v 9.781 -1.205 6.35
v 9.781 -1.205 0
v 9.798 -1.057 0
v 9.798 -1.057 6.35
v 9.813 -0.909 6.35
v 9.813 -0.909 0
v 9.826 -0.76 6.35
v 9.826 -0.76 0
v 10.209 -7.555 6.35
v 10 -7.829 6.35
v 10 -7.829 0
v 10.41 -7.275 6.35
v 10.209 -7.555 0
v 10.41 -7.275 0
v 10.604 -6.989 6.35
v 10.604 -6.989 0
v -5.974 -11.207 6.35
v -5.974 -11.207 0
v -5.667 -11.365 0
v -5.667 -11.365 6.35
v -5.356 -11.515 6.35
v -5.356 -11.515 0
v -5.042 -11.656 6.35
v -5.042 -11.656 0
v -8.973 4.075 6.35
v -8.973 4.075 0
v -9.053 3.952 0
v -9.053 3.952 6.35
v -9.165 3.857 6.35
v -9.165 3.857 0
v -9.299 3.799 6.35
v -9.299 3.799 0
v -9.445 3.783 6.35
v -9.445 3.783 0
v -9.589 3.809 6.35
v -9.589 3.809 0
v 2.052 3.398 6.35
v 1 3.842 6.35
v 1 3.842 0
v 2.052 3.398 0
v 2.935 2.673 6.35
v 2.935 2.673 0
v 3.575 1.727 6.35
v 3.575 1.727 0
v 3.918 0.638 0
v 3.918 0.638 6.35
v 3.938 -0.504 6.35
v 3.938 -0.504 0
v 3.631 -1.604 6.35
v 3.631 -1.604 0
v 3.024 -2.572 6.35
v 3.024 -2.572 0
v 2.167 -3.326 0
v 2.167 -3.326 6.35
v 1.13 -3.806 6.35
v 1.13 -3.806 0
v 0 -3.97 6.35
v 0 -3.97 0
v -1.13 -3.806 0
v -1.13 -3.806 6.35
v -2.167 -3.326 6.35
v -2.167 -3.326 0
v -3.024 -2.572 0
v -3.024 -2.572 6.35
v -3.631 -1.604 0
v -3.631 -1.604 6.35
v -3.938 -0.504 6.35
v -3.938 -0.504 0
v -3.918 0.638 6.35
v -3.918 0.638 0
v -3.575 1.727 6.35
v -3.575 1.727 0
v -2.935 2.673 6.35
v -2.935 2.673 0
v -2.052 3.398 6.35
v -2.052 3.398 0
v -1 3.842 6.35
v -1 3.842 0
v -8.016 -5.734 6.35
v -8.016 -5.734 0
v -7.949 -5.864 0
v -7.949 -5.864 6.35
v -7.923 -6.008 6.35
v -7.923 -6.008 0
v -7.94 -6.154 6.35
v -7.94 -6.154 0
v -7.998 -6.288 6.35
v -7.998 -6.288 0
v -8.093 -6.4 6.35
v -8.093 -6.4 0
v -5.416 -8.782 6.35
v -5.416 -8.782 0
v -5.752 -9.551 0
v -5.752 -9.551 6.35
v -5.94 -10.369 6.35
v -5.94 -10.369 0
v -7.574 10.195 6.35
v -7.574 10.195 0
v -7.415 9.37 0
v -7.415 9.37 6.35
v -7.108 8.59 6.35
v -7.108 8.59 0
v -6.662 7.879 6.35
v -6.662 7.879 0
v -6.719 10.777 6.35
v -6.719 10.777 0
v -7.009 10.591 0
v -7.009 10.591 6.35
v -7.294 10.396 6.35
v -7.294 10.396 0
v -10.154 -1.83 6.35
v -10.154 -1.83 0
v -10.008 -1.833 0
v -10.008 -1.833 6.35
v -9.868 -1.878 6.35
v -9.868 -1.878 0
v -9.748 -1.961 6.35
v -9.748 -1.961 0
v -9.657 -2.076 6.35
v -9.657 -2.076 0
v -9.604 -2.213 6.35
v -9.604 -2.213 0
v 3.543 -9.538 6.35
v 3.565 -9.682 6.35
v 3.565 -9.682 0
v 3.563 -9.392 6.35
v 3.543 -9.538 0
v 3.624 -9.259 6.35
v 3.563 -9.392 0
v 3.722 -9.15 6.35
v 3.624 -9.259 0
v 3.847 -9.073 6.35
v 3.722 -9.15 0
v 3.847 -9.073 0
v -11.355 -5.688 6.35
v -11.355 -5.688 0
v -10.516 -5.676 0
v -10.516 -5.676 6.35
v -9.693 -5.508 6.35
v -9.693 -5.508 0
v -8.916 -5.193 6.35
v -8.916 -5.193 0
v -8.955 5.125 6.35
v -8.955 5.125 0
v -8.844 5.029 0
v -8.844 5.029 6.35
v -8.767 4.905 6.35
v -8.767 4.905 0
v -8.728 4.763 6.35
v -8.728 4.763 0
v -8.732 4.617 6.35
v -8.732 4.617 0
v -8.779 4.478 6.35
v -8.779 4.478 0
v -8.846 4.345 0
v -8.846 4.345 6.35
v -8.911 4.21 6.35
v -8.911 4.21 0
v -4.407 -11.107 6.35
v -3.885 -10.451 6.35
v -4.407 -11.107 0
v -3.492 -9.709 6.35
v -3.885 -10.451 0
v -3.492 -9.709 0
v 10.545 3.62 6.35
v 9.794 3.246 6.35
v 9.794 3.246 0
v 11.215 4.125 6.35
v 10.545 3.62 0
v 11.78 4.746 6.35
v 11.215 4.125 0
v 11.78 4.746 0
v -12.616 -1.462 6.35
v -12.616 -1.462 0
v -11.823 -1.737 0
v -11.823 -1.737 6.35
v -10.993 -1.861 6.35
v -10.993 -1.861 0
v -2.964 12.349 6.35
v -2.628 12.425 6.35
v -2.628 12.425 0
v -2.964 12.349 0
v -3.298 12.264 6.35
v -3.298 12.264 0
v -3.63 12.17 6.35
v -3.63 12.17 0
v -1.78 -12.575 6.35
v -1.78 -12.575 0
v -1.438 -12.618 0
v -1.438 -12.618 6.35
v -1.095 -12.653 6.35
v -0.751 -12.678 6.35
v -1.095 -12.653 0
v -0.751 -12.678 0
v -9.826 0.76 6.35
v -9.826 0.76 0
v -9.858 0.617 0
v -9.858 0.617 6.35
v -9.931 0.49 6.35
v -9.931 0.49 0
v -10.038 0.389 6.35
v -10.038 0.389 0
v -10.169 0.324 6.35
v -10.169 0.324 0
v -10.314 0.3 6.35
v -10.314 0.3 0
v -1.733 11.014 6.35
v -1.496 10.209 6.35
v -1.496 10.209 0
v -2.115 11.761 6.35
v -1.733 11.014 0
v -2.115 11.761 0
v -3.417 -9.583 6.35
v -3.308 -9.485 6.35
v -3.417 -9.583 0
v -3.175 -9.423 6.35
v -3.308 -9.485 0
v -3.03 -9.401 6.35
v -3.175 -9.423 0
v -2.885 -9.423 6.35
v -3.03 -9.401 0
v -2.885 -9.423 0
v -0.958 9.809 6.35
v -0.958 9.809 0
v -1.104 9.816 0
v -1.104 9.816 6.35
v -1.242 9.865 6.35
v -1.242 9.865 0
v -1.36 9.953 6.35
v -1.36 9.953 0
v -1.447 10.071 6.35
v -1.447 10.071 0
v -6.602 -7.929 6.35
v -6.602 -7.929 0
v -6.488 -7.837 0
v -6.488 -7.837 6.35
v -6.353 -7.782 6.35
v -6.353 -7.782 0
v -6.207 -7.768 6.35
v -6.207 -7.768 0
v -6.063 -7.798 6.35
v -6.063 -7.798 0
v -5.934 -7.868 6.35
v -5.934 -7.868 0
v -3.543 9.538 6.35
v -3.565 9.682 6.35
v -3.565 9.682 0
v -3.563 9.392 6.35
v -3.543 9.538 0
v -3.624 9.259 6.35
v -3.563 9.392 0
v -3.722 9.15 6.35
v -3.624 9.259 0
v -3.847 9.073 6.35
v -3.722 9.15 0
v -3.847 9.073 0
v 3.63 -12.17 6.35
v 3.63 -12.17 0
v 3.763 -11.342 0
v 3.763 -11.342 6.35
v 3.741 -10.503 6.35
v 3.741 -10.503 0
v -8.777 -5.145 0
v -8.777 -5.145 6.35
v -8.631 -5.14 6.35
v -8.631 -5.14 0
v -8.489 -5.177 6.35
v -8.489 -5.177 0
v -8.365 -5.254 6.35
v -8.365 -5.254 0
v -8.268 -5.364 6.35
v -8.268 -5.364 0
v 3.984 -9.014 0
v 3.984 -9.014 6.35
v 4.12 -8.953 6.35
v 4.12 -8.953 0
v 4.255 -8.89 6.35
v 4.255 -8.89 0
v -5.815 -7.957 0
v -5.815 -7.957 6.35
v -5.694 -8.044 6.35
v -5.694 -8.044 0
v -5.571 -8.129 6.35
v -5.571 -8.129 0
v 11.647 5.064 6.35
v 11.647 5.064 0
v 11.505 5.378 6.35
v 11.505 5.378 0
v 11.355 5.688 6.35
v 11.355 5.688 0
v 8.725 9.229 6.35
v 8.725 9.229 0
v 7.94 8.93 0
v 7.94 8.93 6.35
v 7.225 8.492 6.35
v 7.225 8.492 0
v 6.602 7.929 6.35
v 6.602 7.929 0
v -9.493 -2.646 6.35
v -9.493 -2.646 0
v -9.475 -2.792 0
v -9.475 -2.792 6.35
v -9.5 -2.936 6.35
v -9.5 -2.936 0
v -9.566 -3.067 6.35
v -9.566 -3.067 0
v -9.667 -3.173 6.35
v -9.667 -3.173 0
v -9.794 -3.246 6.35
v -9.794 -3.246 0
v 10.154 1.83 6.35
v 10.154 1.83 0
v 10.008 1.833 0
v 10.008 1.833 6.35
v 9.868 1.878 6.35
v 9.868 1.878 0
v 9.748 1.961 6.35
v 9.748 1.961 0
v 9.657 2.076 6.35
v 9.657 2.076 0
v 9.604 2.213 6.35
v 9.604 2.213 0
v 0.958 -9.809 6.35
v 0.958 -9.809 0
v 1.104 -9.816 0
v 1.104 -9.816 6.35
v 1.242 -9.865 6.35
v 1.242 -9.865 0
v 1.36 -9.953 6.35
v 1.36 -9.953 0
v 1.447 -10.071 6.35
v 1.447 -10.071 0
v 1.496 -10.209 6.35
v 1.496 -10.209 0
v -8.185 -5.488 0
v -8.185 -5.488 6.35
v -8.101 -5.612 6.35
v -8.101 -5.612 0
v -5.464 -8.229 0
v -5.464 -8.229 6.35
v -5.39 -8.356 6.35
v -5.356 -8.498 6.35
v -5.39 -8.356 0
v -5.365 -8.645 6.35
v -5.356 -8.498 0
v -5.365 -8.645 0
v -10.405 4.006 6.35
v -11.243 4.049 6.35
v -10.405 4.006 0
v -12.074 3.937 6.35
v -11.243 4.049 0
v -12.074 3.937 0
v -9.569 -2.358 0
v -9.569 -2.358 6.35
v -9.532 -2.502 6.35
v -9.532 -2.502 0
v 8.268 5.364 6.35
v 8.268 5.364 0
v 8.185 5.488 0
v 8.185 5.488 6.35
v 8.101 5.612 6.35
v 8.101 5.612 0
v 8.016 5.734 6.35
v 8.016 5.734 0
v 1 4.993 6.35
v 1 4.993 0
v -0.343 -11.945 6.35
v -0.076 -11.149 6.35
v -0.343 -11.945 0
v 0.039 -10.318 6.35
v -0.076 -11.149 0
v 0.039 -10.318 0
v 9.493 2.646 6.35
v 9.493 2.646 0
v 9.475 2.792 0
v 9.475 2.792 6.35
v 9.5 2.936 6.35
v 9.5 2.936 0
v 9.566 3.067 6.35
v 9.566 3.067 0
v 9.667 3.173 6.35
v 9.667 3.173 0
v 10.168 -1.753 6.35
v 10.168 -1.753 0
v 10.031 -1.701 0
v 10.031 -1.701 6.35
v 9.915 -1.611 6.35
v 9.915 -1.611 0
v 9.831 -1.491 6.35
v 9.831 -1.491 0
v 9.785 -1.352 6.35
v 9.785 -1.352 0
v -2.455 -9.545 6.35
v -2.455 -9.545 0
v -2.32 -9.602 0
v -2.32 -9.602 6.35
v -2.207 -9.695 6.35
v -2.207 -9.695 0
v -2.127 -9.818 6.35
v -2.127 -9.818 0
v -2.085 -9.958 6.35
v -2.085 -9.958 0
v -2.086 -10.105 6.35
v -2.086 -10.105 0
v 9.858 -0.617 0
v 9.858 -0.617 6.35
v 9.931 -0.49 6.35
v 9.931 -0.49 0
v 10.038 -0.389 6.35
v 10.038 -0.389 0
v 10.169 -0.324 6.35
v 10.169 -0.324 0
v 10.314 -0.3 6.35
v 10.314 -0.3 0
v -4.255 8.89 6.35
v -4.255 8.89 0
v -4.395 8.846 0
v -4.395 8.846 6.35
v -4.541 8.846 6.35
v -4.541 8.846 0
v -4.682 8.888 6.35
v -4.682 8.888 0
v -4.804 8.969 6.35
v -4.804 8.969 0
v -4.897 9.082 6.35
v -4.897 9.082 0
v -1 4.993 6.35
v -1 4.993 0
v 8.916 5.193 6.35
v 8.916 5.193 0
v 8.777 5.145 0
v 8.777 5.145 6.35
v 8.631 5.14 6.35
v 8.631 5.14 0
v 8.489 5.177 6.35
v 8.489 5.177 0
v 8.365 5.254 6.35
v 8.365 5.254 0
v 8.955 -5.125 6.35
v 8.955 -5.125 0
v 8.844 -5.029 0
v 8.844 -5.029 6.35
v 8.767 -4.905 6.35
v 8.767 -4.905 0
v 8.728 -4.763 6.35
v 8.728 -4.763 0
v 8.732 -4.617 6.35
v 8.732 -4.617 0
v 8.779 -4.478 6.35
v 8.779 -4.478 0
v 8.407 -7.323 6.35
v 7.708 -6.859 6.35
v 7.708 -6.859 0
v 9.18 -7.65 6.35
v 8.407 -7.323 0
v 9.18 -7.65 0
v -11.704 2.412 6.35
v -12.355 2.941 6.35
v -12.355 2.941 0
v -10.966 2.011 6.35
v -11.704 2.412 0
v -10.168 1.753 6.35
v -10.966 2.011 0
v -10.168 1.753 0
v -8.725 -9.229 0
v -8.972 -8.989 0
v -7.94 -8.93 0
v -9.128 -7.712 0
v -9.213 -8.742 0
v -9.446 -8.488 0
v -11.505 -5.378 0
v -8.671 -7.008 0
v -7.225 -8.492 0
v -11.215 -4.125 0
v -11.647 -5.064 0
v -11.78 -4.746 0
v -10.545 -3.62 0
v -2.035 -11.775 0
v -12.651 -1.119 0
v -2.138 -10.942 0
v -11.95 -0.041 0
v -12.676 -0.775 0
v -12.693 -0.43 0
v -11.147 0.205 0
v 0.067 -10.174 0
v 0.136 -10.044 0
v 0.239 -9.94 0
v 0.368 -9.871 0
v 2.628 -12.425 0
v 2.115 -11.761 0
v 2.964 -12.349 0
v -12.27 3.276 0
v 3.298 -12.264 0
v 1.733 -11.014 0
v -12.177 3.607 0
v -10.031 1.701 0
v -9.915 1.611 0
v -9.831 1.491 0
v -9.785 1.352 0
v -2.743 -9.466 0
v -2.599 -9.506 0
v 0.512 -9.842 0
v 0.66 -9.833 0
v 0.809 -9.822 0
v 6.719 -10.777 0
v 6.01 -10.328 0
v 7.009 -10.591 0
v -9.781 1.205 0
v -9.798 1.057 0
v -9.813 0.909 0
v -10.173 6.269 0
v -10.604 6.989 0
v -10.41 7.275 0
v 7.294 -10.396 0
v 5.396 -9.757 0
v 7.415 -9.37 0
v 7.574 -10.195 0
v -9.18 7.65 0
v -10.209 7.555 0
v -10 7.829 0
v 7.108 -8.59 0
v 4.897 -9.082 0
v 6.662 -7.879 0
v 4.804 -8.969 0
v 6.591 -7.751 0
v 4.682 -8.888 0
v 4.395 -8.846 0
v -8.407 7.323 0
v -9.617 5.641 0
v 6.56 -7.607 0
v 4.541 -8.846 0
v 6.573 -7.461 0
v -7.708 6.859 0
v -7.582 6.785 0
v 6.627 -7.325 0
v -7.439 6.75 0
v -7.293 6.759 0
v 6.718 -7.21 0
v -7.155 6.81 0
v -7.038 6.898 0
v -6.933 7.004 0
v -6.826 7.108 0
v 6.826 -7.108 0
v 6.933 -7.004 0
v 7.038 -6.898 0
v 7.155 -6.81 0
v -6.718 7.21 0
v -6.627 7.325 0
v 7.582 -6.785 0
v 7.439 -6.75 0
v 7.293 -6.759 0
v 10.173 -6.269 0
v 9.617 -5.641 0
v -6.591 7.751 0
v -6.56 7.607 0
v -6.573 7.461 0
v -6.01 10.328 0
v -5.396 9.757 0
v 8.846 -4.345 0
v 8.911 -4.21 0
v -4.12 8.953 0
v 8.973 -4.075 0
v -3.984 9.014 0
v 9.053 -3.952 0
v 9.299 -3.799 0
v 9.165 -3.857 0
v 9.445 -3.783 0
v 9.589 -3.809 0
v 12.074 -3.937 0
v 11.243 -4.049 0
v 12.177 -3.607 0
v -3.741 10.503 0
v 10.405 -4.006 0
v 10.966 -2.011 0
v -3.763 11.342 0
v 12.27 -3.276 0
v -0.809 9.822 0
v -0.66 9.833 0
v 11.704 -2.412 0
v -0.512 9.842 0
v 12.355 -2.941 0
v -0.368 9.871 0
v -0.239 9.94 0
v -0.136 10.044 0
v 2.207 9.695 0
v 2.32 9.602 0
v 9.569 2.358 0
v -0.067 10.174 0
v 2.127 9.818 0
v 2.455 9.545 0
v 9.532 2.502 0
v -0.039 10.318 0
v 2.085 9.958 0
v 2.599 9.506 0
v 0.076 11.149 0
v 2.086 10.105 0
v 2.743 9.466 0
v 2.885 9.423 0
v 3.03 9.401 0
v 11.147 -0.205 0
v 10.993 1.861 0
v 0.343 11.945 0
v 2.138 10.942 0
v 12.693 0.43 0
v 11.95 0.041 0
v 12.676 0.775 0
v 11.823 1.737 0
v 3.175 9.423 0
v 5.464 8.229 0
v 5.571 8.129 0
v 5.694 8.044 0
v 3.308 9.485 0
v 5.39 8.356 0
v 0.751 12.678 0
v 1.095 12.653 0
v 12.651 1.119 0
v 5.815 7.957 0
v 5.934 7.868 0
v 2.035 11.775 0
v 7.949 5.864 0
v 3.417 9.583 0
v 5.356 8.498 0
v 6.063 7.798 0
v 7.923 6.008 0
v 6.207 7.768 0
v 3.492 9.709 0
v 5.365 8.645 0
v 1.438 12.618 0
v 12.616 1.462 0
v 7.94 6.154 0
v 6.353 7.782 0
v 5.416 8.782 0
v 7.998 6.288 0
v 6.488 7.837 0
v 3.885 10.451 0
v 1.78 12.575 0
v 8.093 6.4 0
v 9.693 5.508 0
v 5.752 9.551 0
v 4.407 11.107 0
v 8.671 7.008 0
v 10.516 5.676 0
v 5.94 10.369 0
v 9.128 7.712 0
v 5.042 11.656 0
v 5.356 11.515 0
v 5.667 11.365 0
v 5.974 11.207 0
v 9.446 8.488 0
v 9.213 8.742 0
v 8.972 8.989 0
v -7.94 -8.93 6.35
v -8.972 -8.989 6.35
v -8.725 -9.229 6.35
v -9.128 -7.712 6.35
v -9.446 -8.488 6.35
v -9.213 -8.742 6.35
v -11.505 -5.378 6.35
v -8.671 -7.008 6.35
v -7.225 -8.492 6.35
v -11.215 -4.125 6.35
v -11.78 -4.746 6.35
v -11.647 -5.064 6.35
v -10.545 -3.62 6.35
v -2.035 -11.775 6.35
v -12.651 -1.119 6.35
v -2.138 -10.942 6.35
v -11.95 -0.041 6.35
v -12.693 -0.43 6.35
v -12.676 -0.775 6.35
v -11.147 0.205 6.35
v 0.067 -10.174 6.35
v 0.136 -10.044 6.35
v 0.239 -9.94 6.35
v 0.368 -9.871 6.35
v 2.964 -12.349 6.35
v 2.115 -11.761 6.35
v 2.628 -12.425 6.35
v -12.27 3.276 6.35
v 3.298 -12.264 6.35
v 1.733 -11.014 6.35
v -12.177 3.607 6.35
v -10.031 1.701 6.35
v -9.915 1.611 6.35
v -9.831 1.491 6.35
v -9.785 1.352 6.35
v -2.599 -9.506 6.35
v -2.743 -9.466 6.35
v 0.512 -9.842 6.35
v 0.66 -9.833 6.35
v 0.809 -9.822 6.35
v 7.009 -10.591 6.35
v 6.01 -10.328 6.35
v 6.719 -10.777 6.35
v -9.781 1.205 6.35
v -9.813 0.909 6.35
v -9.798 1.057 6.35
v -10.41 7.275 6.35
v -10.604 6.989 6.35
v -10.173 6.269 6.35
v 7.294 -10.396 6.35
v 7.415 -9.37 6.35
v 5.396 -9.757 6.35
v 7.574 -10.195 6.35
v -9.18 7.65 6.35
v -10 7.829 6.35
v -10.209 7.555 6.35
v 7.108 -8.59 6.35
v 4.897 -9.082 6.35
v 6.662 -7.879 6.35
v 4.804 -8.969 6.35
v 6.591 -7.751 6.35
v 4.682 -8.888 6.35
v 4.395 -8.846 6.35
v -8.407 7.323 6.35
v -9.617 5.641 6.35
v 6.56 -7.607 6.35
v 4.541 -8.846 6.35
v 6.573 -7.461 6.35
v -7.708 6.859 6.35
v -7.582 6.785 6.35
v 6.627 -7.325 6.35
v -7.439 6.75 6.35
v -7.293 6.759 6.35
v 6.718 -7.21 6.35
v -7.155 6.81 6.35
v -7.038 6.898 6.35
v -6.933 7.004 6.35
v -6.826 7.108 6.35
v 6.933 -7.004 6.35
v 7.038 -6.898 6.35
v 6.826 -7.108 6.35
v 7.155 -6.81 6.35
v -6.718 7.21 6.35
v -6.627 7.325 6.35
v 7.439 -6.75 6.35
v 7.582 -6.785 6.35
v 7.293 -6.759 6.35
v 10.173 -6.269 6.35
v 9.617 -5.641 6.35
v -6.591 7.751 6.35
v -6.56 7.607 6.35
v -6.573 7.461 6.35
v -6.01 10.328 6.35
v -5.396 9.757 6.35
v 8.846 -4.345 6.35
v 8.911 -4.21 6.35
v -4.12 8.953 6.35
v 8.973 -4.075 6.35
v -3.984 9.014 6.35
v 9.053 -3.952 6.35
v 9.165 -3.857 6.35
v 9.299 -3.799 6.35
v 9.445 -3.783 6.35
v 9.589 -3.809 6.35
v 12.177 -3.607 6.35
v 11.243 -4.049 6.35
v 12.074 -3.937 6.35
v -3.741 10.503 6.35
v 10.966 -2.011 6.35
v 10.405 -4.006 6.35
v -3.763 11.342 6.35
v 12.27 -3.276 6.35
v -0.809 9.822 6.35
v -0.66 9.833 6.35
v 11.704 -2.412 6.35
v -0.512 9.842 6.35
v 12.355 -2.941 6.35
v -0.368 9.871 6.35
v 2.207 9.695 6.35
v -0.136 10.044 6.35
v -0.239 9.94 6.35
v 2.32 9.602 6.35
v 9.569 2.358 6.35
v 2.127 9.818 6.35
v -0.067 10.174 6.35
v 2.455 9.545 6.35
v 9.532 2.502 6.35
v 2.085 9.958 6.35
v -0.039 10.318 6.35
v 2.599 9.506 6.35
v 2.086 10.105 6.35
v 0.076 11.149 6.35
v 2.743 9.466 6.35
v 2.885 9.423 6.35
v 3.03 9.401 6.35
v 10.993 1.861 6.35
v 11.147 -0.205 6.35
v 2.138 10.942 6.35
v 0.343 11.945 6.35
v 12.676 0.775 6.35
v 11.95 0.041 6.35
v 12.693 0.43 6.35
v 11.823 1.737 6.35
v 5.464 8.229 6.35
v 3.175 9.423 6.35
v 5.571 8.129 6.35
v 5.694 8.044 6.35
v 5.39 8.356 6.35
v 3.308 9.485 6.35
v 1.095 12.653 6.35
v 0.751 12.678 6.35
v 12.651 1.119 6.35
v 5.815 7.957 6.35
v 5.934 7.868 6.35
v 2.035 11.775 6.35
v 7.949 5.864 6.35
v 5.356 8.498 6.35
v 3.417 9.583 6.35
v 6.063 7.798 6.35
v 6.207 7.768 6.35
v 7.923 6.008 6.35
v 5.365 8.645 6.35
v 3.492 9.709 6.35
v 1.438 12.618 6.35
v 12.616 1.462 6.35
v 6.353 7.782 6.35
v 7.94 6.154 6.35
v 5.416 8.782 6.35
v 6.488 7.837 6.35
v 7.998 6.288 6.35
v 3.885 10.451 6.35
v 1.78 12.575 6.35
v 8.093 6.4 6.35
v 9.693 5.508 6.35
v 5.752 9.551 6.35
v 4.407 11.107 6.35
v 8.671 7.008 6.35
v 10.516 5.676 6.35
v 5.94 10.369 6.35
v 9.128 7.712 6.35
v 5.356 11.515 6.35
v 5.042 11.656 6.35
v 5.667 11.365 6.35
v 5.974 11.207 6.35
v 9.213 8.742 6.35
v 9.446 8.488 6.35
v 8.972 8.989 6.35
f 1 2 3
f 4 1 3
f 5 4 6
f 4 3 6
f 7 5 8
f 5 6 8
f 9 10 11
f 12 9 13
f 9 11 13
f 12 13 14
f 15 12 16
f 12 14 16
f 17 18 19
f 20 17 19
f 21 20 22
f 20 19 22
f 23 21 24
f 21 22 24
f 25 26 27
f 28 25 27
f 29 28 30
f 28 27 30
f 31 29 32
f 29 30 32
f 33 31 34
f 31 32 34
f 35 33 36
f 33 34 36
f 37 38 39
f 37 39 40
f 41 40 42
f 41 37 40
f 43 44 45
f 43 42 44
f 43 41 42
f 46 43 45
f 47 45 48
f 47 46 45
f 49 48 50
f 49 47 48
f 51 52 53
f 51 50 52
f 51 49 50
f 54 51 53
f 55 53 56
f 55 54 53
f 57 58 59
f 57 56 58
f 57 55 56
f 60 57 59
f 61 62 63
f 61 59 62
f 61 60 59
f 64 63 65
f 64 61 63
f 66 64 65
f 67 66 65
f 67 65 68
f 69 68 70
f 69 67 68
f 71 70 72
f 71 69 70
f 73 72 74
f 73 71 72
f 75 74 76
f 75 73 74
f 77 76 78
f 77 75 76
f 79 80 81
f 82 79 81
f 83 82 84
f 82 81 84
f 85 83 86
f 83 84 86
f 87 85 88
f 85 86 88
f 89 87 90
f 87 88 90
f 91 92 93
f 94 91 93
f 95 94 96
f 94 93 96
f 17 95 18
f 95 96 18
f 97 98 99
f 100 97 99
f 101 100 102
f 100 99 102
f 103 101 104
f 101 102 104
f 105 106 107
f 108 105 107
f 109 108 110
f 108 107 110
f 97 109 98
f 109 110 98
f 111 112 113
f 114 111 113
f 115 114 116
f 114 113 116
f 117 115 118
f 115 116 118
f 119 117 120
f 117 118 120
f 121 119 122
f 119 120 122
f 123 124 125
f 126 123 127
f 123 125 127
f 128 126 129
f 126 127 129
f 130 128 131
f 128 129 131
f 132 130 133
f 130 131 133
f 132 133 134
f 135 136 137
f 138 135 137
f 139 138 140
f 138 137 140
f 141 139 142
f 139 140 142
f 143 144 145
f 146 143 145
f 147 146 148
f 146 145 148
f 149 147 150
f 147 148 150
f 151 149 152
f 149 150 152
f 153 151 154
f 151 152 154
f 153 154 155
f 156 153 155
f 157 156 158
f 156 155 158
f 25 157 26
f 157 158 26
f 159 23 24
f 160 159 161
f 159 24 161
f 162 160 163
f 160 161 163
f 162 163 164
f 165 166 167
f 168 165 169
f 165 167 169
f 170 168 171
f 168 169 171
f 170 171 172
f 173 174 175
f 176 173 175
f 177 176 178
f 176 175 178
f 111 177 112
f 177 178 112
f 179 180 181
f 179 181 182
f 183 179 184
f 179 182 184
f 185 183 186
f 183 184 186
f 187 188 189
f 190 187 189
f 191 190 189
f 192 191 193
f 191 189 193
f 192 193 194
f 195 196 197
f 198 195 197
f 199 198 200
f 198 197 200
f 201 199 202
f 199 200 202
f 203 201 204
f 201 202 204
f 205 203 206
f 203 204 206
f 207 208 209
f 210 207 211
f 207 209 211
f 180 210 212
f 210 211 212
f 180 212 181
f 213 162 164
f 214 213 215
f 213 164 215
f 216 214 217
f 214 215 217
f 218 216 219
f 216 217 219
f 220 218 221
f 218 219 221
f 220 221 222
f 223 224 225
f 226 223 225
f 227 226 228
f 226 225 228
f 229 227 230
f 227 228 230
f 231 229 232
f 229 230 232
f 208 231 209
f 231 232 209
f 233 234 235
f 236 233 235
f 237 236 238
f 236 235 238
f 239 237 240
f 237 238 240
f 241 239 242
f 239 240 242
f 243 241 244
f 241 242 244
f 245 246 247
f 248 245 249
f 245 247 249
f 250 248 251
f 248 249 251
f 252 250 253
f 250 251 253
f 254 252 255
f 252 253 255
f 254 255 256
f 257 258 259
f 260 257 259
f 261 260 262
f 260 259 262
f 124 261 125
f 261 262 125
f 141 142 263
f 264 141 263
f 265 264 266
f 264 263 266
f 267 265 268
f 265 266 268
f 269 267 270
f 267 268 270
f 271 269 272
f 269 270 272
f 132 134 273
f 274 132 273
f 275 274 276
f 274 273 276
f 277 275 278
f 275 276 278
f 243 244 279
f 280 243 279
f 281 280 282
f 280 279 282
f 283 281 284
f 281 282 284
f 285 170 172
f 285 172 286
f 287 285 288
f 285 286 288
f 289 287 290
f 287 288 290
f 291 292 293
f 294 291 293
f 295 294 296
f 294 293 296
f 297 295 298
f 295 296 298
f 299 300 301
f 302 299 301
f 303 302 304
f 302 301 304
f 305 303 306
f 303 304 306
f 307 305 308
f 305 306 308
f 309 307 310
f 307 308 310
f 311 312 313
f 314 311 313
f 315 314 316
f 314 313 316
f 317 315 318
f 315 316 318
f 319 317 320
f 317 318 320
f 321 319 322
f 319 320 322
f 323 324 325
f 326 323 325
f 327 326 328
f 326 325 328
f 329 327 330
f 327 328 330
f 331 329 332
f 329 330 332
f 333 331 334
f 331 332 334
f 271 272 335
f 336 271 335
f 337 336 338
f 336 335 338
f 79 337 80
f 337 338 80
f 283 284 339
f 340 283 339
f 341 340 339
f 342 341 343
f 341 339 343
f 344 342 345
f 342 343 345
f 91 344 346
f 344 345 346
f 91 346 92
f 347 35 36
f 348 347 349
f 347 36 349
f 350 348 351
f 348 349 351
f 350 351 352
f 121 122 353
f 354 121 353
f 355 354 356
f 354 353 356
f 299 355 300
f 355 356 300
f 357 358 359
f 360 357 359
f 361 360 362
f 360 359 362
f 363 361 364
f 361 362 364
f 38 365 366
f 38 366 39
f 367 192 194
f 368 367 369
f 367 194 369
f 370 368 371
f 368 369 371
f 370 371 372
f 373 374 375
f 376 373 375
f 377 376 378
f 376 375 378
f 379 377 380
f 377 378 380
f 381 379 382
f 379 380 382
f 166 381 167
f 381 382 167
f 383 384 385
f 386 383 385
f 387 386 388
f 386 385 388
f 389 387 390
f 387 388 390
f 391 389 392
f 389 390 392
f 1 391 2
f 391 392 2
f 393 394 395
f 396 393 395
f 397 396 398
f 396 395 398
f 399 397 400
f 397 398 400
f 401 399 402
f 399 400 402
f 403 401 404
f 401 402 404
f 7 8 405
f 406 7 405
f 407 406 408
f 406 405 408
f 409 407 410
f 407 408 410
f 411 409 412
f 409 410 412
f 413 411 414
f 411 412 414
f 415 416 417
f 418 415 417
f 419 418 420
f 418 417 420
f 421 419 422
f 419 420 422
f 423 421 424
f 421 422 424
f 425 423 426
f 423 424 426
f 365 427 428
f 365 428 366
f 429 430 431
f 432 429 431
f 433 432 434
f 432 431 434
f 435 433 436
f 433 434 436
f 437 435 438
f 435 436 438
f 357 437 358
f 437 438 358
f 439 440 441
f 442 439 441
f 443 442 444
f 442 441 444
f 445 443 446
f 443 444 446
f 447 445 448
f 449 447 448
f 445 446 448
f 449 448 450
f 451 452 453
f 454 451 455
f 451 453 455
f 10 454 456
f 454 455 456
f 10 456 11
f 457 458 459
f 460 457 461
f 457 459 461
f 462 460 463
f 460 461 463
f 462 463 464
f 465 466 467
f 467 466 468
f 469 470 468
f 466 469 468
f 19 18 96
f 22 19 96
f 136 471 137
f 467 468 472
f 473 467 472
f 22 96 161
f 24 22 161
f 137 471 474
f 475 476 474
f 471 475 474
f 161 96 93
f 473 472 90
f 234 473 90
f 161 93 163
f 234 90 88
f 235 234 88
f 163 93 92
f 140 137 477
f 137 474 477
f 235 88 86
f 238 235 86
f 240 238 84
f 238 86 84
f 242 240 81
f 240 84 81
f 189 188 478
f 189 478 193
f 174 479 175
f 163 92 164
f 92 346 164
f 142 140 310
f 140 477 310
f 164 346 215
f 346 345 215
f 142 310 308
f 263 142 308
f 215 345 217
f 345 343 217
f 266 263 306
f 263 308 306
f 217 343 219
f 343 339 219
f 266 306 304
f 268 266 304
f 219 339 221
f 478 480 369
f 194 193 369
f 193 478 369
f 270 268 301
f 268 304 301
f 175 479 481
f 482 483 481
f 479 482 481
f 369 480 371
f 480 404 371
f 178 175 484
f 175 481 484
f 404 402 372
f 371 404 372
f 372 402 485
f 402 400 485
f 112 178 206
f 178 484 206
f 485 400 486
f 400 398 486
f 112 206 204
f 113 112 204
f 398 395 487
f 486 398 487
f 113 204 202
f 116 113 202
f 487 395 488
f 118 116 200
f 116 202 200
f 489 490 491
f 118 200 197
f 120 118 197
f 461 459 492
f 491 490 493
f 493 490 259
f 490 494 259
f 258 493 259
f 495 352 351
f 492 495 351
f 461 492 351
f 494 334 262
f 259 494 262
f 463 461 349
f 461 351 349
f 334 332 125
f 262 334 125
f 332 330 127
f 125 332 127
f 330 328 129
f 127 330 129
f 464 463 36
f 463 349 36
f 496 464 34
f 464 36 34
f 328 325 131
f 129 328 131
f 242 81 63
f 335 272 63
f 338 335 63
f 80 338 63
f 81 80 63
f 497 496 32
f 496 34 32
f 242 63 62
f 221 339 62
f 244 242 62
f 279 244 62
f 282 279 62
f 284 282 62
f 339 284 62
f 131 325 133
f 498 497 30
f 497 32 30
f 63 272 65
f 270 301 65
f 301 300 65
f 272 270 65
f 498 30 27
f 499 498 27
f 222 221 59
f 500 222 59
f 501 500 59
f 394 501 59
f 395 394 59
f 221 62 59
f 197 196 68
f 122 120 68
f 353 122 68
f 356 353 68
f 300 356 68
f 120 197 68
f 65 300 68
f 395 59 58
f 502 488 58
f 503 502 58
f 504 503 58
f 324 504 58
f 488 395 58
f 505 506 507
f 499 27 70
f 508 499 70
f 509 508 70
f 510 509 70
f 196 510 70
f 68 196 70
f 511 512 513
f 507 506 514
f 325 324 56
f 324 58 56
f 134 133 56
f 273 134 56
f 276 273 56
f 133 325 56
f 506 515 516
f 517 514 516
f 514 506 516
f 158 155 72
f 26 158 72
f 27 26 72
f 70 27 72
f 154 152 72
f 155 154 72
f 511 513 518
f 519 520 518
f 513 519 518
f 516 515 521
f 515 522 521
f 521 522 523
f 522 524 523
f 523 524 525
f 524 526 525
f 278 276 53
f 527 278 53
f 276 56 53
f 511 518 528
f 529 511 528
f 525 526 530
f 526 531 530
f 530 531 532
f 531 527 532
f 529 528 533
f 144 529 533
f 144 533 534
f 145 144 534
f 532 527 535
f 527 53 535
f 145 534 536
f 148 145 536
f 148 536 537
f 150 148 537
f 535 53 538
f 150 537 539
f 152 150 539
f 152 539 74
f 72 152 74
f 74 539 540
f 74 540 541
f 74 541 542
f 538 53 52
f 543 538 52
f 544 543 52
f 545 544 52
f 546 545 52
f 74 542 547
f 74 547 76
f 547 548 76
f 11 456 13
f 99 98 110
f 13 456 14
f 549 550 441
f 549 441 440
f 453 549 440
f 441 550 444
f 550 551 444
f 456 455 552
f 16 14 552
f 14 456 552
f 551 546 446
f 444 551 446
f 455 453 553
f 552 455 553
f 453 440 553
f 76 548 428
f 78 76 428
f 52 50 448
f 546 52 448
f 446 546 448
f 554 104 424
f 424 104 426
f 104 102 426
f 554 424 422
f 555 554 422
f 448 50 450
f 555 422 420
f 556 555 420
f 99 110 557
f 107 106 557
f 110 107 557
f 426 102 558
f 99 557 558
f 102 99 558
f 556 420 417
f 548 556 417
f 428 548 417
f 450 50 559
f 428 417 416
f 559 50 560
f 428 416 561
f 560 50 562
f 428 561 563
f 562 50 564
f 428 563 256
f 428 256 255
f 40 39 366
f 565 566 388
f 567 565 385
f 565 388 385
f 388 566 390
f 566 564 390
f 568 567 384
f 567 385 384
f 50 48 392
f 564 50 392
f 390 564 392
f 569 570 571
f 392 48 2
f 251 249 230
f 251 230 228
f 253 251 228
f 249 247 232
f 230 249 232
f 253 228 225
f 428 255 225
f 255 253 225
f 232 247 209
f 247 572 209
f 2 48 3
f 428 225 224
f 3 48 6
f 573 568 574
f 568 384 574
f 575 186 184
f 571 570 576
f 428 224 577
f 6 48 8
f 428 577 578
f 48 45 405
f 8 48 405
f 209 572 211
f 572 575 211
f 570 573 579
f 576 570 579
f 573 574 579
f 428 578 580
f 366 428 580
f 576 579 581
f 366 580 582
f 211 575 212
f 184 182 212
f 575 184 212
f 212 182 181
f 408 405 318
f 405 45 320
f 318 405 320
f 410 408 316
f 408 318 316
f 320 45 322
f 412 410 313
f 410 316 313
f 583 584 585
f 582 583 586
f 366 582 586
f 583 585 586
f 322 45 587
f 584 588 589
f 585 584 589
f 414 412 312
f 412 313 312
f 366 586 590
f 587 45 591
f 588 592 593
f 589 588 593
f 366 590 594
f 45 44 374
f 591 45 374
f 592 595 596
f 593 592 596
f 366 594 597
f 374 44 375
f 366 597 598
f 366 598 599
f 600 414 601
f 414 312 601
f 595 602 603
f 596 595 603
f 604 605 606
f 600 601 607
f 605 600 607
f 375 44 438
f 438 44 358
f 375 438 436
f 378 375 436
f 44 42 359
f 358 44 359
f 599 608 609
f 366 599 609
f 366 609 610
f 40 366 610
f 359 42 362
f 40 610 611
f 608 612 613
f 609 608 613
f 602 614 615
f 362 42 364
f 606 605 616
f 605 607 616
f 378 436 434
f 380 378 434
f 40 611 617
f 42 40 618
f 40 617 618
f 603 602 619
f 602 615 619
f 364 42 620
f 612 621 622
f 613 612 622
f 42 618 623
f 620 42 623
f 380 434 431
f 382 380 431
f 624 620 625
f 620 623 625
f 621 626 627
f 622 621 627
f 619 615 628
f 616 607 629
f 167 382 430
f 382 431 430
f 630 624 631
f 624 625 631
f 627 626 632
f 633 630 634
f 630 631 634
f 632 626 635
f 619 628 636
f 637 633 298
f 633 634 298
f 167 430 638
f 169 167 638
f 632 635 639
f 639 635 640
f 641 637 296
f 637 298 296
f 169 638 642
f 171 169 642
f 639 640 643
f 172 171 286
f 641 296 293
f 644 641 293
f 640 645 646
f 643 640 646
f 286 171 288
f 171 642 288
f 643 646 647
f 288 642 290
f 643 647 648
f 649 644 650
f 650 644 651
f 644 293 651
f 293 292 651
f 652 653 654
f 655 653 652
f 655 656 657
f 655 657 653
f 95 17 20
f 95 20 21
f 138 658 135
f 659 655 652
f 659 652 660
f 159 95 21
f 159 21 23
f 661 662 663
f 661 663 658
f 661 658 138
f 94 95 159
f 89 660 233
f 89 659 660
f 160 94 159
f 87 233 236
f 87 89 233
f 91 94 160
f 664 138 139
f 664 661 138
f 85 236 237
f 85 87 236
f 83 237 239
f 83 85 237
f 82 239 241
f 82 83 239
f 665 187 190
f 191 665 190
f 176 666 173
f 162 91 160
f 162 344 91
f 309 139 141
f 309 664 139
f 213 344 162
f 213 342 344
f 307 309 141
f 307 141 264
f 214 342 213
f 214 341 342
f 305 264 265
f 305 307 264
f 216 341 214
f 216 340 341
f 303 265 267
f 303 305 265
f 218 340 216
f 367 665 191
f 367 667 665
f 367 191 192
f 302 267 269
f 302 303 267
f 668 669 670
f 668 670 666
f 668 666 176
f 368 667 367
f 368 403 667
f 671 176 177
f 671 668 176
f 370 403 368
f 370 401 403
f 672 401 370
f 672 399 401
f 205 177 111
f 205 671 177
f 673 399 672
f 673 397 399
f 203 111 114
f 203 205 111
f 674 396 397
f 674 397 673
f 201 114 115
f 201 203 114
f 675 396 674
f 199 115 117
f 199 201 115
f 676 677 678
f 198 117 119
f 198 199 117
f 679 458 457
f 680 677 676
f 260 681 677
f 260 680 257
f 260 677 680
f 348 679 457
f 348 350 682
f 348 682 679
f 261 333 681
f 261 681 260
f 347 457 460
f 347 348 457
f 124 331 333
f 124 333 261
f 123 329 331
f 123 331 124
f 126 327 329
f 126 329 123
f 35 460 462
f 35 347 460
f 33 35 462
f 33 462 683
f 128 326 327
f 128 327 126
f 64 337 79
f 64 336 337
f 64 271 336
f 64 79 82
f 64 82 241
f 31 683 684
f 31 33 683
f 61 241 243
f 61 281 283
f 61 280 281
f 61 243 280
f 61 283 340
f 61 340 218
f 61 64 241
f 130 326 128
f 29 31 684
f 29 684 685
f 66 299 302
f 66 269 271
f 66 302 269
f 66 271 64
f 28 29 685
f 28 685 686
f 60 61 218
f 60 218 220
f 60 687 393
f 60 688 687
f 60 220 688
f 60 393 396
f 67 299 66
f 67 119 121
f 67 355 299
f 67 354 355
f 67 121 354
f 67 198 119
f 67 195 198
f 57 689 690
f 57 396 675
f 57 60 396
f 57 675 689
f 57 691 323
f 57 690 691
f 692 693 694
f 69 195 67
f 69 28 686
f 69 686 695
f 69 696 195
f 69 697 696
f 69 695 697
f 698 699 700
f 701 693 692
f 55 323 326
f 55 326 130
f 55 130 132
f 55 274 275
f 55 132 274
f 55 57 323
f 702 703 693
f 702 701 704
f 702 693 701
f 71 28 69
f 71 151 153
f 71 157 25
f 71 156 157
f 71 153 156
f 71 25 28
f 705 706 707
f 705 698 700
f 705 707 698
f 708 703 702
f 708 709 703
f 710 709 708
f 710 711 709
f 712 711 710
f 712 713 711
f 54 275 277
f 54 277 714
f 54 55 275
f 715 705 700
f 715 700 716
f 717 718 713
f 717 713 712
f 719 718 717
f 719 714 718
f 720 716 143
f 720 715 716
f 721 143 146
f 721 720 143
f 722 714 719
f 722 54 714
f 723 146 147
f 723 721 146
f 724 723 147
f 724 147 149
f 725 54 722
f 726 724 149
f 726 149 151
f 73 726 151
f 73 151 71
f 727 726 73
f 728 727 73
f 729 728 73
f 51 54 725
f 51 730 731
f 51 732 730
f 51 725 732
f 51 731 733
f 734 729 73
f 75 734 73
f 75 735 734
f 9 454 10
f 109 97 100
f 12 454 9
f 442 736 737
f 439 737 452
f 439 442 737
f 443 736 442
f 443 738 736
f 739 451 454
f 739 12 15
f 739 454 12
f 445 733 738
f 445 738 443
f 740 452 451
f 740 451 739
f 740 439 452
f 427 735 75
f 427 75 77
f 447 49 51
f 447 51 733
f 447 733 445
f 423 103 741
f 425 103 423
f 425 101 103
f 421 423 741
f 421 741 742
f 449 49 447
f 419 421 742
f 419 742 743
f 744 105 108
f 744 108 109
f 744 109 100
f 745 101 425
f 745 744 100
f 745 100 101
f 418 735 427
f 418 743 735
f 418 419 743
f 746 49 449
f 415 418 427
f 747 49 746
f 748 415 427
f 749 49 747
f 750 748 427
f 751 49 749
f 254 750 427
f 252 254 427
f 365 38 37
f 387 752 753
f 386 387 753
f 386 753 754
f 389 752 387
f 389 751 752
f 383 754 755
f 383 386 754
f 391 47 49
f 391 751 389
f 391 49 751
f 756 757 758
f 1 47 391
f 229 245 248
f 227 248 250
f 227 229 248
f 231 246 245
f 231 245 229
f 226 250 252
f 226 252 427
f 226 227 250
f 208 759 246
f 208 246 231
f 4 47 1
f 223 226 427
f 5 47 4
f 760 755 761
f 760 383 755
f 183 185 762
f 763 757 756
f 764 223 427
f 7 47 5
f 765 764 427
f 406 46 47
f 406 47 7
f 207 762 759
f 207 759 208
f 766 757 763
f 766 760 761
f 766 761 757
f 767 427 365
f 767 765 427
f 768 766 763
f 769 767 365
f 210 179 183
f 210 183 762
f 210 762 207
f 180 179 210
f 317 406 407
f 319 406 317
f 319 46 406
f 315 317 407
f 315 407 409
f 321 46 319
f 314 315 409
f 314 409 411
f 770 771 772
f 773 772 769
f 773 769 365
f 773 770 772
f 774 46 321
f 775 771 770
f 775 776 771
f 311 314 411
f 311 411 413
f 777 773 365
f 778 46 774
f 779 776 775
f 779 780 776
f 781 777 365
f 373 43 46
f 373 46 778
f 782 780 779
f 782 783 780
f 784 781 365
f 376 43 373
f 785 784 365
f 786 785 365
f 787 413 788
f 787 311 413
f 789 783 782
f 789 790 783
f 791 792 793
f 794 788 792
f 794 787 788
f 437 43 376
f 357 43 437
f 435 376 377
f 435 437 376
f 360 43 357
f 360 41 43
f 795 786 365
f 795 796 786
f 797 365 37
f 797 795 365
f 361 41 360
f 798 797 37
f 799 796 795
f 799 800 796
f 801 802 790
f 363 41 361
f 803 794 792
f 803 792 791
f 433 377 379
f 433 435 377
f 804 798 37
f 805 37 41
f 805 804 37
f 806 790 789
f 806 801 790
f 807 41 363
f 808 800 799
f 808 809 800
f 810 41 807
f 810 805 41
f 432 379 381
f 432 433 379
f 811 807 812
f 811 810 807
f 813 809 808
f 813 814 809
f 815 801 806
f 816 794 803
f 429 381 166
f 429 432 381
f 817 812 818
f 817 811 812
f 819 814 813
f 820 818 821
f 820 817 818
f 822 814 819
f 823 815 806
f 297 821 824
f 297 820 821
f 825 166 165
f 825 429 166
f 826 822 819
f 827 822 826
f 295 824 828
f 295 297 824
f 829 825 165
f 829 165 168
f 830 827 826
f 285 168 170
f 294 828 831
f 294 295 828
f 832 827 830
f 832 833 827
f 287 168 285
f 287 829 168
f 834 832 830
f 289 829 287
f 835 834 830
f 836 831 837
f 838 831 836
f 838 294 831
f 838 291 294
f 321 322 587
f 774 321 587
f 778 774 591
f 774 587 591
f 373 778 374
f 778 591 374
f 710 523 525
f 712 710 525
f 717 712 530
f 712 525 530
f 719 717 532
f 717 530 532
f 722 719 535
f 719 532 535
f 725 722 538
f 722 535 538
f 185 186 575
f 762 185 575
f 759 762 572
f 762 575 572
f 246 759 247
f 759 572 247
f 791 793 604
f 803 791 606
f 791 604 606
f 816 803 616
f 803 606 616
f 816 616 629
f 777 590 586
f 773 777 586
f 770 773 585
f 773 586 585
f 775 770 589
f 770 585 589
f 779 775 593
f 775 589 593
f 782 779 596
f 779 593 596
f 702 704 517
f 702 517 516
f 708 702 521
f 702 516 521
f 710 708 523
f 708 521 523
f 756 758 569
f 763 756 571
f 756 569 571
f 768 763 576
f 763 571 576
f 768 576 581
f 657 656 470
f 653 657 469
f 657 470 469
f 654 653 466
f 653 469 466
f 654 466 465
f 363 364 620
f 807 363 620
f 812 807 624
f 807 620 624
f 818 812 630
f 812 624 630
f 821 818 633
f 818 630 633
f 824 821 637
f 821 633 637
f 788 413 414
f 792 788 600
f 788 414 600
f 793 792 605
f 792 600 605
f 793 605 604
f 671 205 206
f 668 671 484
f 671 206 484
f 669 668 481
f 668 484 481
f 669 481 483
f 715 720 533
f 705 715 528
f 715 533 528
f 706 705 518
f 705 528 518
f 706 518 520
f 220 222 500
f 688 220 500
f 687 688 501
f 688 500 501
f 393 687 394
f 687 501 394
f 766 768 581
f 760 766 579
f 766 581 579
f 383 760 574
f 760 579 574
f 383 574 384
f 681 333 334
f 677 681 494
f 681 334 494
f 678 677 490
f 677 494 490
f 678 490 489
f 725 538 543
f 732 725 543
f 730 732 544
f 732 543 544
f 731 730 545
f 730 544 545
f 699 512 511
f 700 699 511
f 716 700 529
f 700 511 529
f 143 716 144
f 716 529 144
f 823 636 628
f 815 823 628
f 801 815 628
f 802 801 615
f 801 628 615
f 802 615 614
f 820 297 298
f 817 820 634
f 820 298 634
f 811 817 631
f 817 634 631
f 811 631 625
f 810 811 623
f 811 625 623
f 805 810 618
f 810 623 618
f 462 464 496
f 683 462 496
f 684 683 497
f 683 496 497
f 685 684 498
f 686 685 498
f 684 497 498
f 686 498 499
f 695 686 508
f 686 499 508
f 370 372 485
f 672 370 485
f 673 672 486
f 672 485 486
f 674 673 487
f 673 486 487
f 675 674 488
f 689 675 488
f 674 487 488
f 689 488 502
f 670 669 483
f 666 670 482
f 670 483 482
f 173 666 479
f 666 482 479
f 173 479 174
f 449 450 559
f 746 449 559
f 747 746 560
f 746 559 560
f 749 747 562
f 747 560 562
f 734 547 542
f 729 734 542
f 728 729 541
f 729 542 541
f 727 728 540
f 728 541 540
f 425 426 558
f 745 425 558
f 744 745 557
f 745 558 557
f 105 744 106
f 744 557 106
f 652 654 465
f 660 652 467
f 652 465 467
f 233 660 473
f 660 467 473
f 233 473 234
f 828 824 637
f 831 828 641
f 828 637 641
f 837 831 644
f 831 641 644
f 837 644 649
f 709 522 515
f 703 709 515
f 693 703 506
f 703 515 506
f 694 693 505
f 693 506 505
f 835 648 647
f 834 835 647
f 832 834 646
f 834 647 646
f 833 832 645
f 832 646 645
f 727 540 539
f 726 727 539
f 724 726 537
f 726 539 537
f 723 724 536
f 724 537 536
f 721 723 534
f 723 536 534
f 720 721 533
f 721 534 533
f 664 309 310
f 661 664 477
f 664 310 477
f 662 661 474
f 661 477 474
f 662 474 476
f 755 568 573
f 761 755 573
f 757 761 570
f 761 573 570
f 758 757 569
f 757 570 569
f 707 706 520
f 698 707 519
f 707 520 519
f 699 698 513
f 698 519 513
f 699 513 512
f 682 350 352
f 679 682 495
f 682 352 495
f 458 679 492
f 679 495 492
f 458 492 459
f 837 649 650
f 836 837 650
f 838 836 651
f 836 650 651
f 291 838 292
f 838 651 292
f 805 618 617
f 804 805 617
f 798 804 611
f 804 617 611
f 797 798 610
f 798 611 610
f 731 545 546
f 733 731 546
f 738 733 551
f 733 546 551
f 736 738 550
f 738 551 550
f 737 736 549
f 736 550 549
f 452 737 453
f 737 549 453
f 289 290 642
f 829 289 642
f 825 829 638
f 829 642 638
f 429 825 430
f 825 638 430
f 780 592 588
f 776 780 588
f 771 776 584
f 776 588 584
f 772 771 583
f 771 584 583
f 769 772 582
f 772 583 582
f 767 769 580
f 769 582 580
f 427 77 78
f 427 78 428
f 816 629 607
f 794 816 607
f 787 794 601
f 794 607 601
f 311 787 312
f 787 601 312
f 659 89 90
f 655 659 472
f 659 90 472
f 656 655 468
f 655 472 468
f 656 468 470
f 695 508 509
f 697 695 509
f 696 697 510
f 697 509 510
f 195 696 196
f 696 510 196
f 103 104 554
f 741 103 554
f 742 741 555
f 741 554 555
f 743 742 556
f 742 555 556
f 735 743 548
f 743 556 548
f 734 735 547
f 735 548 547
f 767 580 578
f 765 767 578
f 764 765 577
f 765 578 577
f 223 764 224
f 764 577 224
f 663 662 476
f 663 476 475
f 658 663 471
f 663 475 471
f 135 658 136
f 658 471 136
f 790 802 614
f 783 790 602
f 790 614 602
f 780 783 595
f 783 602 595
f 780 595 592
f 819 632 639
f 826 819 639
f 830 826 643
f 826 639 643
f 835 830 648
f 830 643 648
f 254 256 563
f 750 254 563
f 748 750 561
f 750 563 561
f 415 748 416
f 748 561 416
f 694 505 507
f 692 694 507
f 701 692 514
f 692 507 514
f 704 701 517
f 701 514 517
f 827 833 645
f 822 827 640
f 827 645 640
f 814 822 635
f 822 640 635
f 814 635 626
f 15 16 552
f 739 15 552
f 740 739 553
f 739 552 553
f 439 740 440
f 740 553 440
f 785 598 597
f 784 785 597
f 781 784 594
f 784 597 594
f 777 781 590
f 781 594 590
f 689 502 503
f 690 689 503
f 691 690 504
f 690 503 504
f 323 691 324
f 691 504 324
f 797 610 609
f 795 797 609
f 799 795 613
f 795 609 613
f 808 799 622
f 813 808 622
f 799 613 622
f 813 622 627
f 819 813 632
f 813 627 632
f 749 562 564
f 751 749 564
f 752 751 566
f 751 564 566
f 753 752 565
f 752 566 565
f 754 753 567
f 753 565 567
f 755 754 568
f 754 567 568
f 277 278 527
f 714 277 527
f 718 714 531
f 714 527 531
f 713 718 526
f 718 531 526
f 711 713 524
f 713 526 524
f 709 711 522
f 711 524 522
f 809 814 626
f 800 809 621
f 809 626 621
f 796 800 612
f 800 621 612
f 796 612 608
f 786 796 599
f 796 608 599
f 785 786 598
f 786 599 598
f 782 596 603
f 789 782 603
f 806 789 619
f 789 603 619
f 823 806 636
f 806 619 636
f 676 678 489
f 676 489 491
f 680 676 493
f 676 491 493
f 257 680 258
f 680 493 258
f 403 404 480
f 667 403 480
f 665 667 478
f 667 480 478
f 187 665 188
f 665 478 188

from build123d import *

# Parameters (mm, degrees)
SKETCH3_R         = 12.7
GEARBODY_DEPTH    = 6.35
TOOTHCUT_DEPTH    = 7.35
CIRPATTERN1_COUNT = 18
BORE_DEPTH        = 12.7


with BuildPart() as part:
    # Sketch3 → gearBody (new body)
    with BuildSketch(Plane.XY):
        Circle(SKETCH3_R)
    extrude(amount=GEARBODY_DEPTH)

    # Sketch2 → toothCut (cut, through all)
    with BuildSketch(Plane.XY):
        with BuildLine():
            ThreePointArc((9.781229257, -1.205205904), (9.806057787, -0.982953571), (9.825836884, -0.760195085))
            ThreePointArc((9.825836884, -0.760195085), (9.980803767, -0.435792976), (10.31355819, -0.299682883))
            ThreePointArc((10.31355819, -0.299682883), (12.38209996, 0.246018063), (13.970369973, 1.679214819))
            ThreePointArc((13.970369973, 1.679214819), (14.000763839, -1.403428484), (13.359117821, -4.418706897))
            ThreePointArc((13.359117821, -4.418706897), (12.0869153, -2.698778026), (10.167842346, -1.753360882))
            ThreePointArc((10.167842346, -1.753360882), (9.868724138, -1.553912241), (9.781229257, -1.205205904))
        make_face()
    toothcut = extrude(amount=TOOTHCUT_DEPTH, mode=Mode.SUBTRACT)

    # CirPattern1: toothCut ×18 about axis
    cirpattern1_axis = Axis((0, 0, 0), (0, 0, 1))
    for i in range(1, CIRPATTERN1_COUNT):
        add(toothcut.rotate(cirpattern1_axis, i * 360 / CIRPATTERN1_COUNT), mode=Mode.SUBTRACT)

    # boreDia → bore (cut, symmetric)
    with BuildSketch(Plane.XY):
        with BuildLine():
            Line((-1, 3.842012337), (-1, 4.992632337))
            Line((-1, 4.992632337), (1, 4.992632337))
            Line((1, 4.992632337), (1, 3.842012337))
            ThreePointArc((1, 3.842012337), (0, -3.97002), (-1, 3.842012337))
        make_face()
    extrude(amount=BORE_DEPTH, both=True, mode=Mode.SUBTRACT)


solid = part.part
